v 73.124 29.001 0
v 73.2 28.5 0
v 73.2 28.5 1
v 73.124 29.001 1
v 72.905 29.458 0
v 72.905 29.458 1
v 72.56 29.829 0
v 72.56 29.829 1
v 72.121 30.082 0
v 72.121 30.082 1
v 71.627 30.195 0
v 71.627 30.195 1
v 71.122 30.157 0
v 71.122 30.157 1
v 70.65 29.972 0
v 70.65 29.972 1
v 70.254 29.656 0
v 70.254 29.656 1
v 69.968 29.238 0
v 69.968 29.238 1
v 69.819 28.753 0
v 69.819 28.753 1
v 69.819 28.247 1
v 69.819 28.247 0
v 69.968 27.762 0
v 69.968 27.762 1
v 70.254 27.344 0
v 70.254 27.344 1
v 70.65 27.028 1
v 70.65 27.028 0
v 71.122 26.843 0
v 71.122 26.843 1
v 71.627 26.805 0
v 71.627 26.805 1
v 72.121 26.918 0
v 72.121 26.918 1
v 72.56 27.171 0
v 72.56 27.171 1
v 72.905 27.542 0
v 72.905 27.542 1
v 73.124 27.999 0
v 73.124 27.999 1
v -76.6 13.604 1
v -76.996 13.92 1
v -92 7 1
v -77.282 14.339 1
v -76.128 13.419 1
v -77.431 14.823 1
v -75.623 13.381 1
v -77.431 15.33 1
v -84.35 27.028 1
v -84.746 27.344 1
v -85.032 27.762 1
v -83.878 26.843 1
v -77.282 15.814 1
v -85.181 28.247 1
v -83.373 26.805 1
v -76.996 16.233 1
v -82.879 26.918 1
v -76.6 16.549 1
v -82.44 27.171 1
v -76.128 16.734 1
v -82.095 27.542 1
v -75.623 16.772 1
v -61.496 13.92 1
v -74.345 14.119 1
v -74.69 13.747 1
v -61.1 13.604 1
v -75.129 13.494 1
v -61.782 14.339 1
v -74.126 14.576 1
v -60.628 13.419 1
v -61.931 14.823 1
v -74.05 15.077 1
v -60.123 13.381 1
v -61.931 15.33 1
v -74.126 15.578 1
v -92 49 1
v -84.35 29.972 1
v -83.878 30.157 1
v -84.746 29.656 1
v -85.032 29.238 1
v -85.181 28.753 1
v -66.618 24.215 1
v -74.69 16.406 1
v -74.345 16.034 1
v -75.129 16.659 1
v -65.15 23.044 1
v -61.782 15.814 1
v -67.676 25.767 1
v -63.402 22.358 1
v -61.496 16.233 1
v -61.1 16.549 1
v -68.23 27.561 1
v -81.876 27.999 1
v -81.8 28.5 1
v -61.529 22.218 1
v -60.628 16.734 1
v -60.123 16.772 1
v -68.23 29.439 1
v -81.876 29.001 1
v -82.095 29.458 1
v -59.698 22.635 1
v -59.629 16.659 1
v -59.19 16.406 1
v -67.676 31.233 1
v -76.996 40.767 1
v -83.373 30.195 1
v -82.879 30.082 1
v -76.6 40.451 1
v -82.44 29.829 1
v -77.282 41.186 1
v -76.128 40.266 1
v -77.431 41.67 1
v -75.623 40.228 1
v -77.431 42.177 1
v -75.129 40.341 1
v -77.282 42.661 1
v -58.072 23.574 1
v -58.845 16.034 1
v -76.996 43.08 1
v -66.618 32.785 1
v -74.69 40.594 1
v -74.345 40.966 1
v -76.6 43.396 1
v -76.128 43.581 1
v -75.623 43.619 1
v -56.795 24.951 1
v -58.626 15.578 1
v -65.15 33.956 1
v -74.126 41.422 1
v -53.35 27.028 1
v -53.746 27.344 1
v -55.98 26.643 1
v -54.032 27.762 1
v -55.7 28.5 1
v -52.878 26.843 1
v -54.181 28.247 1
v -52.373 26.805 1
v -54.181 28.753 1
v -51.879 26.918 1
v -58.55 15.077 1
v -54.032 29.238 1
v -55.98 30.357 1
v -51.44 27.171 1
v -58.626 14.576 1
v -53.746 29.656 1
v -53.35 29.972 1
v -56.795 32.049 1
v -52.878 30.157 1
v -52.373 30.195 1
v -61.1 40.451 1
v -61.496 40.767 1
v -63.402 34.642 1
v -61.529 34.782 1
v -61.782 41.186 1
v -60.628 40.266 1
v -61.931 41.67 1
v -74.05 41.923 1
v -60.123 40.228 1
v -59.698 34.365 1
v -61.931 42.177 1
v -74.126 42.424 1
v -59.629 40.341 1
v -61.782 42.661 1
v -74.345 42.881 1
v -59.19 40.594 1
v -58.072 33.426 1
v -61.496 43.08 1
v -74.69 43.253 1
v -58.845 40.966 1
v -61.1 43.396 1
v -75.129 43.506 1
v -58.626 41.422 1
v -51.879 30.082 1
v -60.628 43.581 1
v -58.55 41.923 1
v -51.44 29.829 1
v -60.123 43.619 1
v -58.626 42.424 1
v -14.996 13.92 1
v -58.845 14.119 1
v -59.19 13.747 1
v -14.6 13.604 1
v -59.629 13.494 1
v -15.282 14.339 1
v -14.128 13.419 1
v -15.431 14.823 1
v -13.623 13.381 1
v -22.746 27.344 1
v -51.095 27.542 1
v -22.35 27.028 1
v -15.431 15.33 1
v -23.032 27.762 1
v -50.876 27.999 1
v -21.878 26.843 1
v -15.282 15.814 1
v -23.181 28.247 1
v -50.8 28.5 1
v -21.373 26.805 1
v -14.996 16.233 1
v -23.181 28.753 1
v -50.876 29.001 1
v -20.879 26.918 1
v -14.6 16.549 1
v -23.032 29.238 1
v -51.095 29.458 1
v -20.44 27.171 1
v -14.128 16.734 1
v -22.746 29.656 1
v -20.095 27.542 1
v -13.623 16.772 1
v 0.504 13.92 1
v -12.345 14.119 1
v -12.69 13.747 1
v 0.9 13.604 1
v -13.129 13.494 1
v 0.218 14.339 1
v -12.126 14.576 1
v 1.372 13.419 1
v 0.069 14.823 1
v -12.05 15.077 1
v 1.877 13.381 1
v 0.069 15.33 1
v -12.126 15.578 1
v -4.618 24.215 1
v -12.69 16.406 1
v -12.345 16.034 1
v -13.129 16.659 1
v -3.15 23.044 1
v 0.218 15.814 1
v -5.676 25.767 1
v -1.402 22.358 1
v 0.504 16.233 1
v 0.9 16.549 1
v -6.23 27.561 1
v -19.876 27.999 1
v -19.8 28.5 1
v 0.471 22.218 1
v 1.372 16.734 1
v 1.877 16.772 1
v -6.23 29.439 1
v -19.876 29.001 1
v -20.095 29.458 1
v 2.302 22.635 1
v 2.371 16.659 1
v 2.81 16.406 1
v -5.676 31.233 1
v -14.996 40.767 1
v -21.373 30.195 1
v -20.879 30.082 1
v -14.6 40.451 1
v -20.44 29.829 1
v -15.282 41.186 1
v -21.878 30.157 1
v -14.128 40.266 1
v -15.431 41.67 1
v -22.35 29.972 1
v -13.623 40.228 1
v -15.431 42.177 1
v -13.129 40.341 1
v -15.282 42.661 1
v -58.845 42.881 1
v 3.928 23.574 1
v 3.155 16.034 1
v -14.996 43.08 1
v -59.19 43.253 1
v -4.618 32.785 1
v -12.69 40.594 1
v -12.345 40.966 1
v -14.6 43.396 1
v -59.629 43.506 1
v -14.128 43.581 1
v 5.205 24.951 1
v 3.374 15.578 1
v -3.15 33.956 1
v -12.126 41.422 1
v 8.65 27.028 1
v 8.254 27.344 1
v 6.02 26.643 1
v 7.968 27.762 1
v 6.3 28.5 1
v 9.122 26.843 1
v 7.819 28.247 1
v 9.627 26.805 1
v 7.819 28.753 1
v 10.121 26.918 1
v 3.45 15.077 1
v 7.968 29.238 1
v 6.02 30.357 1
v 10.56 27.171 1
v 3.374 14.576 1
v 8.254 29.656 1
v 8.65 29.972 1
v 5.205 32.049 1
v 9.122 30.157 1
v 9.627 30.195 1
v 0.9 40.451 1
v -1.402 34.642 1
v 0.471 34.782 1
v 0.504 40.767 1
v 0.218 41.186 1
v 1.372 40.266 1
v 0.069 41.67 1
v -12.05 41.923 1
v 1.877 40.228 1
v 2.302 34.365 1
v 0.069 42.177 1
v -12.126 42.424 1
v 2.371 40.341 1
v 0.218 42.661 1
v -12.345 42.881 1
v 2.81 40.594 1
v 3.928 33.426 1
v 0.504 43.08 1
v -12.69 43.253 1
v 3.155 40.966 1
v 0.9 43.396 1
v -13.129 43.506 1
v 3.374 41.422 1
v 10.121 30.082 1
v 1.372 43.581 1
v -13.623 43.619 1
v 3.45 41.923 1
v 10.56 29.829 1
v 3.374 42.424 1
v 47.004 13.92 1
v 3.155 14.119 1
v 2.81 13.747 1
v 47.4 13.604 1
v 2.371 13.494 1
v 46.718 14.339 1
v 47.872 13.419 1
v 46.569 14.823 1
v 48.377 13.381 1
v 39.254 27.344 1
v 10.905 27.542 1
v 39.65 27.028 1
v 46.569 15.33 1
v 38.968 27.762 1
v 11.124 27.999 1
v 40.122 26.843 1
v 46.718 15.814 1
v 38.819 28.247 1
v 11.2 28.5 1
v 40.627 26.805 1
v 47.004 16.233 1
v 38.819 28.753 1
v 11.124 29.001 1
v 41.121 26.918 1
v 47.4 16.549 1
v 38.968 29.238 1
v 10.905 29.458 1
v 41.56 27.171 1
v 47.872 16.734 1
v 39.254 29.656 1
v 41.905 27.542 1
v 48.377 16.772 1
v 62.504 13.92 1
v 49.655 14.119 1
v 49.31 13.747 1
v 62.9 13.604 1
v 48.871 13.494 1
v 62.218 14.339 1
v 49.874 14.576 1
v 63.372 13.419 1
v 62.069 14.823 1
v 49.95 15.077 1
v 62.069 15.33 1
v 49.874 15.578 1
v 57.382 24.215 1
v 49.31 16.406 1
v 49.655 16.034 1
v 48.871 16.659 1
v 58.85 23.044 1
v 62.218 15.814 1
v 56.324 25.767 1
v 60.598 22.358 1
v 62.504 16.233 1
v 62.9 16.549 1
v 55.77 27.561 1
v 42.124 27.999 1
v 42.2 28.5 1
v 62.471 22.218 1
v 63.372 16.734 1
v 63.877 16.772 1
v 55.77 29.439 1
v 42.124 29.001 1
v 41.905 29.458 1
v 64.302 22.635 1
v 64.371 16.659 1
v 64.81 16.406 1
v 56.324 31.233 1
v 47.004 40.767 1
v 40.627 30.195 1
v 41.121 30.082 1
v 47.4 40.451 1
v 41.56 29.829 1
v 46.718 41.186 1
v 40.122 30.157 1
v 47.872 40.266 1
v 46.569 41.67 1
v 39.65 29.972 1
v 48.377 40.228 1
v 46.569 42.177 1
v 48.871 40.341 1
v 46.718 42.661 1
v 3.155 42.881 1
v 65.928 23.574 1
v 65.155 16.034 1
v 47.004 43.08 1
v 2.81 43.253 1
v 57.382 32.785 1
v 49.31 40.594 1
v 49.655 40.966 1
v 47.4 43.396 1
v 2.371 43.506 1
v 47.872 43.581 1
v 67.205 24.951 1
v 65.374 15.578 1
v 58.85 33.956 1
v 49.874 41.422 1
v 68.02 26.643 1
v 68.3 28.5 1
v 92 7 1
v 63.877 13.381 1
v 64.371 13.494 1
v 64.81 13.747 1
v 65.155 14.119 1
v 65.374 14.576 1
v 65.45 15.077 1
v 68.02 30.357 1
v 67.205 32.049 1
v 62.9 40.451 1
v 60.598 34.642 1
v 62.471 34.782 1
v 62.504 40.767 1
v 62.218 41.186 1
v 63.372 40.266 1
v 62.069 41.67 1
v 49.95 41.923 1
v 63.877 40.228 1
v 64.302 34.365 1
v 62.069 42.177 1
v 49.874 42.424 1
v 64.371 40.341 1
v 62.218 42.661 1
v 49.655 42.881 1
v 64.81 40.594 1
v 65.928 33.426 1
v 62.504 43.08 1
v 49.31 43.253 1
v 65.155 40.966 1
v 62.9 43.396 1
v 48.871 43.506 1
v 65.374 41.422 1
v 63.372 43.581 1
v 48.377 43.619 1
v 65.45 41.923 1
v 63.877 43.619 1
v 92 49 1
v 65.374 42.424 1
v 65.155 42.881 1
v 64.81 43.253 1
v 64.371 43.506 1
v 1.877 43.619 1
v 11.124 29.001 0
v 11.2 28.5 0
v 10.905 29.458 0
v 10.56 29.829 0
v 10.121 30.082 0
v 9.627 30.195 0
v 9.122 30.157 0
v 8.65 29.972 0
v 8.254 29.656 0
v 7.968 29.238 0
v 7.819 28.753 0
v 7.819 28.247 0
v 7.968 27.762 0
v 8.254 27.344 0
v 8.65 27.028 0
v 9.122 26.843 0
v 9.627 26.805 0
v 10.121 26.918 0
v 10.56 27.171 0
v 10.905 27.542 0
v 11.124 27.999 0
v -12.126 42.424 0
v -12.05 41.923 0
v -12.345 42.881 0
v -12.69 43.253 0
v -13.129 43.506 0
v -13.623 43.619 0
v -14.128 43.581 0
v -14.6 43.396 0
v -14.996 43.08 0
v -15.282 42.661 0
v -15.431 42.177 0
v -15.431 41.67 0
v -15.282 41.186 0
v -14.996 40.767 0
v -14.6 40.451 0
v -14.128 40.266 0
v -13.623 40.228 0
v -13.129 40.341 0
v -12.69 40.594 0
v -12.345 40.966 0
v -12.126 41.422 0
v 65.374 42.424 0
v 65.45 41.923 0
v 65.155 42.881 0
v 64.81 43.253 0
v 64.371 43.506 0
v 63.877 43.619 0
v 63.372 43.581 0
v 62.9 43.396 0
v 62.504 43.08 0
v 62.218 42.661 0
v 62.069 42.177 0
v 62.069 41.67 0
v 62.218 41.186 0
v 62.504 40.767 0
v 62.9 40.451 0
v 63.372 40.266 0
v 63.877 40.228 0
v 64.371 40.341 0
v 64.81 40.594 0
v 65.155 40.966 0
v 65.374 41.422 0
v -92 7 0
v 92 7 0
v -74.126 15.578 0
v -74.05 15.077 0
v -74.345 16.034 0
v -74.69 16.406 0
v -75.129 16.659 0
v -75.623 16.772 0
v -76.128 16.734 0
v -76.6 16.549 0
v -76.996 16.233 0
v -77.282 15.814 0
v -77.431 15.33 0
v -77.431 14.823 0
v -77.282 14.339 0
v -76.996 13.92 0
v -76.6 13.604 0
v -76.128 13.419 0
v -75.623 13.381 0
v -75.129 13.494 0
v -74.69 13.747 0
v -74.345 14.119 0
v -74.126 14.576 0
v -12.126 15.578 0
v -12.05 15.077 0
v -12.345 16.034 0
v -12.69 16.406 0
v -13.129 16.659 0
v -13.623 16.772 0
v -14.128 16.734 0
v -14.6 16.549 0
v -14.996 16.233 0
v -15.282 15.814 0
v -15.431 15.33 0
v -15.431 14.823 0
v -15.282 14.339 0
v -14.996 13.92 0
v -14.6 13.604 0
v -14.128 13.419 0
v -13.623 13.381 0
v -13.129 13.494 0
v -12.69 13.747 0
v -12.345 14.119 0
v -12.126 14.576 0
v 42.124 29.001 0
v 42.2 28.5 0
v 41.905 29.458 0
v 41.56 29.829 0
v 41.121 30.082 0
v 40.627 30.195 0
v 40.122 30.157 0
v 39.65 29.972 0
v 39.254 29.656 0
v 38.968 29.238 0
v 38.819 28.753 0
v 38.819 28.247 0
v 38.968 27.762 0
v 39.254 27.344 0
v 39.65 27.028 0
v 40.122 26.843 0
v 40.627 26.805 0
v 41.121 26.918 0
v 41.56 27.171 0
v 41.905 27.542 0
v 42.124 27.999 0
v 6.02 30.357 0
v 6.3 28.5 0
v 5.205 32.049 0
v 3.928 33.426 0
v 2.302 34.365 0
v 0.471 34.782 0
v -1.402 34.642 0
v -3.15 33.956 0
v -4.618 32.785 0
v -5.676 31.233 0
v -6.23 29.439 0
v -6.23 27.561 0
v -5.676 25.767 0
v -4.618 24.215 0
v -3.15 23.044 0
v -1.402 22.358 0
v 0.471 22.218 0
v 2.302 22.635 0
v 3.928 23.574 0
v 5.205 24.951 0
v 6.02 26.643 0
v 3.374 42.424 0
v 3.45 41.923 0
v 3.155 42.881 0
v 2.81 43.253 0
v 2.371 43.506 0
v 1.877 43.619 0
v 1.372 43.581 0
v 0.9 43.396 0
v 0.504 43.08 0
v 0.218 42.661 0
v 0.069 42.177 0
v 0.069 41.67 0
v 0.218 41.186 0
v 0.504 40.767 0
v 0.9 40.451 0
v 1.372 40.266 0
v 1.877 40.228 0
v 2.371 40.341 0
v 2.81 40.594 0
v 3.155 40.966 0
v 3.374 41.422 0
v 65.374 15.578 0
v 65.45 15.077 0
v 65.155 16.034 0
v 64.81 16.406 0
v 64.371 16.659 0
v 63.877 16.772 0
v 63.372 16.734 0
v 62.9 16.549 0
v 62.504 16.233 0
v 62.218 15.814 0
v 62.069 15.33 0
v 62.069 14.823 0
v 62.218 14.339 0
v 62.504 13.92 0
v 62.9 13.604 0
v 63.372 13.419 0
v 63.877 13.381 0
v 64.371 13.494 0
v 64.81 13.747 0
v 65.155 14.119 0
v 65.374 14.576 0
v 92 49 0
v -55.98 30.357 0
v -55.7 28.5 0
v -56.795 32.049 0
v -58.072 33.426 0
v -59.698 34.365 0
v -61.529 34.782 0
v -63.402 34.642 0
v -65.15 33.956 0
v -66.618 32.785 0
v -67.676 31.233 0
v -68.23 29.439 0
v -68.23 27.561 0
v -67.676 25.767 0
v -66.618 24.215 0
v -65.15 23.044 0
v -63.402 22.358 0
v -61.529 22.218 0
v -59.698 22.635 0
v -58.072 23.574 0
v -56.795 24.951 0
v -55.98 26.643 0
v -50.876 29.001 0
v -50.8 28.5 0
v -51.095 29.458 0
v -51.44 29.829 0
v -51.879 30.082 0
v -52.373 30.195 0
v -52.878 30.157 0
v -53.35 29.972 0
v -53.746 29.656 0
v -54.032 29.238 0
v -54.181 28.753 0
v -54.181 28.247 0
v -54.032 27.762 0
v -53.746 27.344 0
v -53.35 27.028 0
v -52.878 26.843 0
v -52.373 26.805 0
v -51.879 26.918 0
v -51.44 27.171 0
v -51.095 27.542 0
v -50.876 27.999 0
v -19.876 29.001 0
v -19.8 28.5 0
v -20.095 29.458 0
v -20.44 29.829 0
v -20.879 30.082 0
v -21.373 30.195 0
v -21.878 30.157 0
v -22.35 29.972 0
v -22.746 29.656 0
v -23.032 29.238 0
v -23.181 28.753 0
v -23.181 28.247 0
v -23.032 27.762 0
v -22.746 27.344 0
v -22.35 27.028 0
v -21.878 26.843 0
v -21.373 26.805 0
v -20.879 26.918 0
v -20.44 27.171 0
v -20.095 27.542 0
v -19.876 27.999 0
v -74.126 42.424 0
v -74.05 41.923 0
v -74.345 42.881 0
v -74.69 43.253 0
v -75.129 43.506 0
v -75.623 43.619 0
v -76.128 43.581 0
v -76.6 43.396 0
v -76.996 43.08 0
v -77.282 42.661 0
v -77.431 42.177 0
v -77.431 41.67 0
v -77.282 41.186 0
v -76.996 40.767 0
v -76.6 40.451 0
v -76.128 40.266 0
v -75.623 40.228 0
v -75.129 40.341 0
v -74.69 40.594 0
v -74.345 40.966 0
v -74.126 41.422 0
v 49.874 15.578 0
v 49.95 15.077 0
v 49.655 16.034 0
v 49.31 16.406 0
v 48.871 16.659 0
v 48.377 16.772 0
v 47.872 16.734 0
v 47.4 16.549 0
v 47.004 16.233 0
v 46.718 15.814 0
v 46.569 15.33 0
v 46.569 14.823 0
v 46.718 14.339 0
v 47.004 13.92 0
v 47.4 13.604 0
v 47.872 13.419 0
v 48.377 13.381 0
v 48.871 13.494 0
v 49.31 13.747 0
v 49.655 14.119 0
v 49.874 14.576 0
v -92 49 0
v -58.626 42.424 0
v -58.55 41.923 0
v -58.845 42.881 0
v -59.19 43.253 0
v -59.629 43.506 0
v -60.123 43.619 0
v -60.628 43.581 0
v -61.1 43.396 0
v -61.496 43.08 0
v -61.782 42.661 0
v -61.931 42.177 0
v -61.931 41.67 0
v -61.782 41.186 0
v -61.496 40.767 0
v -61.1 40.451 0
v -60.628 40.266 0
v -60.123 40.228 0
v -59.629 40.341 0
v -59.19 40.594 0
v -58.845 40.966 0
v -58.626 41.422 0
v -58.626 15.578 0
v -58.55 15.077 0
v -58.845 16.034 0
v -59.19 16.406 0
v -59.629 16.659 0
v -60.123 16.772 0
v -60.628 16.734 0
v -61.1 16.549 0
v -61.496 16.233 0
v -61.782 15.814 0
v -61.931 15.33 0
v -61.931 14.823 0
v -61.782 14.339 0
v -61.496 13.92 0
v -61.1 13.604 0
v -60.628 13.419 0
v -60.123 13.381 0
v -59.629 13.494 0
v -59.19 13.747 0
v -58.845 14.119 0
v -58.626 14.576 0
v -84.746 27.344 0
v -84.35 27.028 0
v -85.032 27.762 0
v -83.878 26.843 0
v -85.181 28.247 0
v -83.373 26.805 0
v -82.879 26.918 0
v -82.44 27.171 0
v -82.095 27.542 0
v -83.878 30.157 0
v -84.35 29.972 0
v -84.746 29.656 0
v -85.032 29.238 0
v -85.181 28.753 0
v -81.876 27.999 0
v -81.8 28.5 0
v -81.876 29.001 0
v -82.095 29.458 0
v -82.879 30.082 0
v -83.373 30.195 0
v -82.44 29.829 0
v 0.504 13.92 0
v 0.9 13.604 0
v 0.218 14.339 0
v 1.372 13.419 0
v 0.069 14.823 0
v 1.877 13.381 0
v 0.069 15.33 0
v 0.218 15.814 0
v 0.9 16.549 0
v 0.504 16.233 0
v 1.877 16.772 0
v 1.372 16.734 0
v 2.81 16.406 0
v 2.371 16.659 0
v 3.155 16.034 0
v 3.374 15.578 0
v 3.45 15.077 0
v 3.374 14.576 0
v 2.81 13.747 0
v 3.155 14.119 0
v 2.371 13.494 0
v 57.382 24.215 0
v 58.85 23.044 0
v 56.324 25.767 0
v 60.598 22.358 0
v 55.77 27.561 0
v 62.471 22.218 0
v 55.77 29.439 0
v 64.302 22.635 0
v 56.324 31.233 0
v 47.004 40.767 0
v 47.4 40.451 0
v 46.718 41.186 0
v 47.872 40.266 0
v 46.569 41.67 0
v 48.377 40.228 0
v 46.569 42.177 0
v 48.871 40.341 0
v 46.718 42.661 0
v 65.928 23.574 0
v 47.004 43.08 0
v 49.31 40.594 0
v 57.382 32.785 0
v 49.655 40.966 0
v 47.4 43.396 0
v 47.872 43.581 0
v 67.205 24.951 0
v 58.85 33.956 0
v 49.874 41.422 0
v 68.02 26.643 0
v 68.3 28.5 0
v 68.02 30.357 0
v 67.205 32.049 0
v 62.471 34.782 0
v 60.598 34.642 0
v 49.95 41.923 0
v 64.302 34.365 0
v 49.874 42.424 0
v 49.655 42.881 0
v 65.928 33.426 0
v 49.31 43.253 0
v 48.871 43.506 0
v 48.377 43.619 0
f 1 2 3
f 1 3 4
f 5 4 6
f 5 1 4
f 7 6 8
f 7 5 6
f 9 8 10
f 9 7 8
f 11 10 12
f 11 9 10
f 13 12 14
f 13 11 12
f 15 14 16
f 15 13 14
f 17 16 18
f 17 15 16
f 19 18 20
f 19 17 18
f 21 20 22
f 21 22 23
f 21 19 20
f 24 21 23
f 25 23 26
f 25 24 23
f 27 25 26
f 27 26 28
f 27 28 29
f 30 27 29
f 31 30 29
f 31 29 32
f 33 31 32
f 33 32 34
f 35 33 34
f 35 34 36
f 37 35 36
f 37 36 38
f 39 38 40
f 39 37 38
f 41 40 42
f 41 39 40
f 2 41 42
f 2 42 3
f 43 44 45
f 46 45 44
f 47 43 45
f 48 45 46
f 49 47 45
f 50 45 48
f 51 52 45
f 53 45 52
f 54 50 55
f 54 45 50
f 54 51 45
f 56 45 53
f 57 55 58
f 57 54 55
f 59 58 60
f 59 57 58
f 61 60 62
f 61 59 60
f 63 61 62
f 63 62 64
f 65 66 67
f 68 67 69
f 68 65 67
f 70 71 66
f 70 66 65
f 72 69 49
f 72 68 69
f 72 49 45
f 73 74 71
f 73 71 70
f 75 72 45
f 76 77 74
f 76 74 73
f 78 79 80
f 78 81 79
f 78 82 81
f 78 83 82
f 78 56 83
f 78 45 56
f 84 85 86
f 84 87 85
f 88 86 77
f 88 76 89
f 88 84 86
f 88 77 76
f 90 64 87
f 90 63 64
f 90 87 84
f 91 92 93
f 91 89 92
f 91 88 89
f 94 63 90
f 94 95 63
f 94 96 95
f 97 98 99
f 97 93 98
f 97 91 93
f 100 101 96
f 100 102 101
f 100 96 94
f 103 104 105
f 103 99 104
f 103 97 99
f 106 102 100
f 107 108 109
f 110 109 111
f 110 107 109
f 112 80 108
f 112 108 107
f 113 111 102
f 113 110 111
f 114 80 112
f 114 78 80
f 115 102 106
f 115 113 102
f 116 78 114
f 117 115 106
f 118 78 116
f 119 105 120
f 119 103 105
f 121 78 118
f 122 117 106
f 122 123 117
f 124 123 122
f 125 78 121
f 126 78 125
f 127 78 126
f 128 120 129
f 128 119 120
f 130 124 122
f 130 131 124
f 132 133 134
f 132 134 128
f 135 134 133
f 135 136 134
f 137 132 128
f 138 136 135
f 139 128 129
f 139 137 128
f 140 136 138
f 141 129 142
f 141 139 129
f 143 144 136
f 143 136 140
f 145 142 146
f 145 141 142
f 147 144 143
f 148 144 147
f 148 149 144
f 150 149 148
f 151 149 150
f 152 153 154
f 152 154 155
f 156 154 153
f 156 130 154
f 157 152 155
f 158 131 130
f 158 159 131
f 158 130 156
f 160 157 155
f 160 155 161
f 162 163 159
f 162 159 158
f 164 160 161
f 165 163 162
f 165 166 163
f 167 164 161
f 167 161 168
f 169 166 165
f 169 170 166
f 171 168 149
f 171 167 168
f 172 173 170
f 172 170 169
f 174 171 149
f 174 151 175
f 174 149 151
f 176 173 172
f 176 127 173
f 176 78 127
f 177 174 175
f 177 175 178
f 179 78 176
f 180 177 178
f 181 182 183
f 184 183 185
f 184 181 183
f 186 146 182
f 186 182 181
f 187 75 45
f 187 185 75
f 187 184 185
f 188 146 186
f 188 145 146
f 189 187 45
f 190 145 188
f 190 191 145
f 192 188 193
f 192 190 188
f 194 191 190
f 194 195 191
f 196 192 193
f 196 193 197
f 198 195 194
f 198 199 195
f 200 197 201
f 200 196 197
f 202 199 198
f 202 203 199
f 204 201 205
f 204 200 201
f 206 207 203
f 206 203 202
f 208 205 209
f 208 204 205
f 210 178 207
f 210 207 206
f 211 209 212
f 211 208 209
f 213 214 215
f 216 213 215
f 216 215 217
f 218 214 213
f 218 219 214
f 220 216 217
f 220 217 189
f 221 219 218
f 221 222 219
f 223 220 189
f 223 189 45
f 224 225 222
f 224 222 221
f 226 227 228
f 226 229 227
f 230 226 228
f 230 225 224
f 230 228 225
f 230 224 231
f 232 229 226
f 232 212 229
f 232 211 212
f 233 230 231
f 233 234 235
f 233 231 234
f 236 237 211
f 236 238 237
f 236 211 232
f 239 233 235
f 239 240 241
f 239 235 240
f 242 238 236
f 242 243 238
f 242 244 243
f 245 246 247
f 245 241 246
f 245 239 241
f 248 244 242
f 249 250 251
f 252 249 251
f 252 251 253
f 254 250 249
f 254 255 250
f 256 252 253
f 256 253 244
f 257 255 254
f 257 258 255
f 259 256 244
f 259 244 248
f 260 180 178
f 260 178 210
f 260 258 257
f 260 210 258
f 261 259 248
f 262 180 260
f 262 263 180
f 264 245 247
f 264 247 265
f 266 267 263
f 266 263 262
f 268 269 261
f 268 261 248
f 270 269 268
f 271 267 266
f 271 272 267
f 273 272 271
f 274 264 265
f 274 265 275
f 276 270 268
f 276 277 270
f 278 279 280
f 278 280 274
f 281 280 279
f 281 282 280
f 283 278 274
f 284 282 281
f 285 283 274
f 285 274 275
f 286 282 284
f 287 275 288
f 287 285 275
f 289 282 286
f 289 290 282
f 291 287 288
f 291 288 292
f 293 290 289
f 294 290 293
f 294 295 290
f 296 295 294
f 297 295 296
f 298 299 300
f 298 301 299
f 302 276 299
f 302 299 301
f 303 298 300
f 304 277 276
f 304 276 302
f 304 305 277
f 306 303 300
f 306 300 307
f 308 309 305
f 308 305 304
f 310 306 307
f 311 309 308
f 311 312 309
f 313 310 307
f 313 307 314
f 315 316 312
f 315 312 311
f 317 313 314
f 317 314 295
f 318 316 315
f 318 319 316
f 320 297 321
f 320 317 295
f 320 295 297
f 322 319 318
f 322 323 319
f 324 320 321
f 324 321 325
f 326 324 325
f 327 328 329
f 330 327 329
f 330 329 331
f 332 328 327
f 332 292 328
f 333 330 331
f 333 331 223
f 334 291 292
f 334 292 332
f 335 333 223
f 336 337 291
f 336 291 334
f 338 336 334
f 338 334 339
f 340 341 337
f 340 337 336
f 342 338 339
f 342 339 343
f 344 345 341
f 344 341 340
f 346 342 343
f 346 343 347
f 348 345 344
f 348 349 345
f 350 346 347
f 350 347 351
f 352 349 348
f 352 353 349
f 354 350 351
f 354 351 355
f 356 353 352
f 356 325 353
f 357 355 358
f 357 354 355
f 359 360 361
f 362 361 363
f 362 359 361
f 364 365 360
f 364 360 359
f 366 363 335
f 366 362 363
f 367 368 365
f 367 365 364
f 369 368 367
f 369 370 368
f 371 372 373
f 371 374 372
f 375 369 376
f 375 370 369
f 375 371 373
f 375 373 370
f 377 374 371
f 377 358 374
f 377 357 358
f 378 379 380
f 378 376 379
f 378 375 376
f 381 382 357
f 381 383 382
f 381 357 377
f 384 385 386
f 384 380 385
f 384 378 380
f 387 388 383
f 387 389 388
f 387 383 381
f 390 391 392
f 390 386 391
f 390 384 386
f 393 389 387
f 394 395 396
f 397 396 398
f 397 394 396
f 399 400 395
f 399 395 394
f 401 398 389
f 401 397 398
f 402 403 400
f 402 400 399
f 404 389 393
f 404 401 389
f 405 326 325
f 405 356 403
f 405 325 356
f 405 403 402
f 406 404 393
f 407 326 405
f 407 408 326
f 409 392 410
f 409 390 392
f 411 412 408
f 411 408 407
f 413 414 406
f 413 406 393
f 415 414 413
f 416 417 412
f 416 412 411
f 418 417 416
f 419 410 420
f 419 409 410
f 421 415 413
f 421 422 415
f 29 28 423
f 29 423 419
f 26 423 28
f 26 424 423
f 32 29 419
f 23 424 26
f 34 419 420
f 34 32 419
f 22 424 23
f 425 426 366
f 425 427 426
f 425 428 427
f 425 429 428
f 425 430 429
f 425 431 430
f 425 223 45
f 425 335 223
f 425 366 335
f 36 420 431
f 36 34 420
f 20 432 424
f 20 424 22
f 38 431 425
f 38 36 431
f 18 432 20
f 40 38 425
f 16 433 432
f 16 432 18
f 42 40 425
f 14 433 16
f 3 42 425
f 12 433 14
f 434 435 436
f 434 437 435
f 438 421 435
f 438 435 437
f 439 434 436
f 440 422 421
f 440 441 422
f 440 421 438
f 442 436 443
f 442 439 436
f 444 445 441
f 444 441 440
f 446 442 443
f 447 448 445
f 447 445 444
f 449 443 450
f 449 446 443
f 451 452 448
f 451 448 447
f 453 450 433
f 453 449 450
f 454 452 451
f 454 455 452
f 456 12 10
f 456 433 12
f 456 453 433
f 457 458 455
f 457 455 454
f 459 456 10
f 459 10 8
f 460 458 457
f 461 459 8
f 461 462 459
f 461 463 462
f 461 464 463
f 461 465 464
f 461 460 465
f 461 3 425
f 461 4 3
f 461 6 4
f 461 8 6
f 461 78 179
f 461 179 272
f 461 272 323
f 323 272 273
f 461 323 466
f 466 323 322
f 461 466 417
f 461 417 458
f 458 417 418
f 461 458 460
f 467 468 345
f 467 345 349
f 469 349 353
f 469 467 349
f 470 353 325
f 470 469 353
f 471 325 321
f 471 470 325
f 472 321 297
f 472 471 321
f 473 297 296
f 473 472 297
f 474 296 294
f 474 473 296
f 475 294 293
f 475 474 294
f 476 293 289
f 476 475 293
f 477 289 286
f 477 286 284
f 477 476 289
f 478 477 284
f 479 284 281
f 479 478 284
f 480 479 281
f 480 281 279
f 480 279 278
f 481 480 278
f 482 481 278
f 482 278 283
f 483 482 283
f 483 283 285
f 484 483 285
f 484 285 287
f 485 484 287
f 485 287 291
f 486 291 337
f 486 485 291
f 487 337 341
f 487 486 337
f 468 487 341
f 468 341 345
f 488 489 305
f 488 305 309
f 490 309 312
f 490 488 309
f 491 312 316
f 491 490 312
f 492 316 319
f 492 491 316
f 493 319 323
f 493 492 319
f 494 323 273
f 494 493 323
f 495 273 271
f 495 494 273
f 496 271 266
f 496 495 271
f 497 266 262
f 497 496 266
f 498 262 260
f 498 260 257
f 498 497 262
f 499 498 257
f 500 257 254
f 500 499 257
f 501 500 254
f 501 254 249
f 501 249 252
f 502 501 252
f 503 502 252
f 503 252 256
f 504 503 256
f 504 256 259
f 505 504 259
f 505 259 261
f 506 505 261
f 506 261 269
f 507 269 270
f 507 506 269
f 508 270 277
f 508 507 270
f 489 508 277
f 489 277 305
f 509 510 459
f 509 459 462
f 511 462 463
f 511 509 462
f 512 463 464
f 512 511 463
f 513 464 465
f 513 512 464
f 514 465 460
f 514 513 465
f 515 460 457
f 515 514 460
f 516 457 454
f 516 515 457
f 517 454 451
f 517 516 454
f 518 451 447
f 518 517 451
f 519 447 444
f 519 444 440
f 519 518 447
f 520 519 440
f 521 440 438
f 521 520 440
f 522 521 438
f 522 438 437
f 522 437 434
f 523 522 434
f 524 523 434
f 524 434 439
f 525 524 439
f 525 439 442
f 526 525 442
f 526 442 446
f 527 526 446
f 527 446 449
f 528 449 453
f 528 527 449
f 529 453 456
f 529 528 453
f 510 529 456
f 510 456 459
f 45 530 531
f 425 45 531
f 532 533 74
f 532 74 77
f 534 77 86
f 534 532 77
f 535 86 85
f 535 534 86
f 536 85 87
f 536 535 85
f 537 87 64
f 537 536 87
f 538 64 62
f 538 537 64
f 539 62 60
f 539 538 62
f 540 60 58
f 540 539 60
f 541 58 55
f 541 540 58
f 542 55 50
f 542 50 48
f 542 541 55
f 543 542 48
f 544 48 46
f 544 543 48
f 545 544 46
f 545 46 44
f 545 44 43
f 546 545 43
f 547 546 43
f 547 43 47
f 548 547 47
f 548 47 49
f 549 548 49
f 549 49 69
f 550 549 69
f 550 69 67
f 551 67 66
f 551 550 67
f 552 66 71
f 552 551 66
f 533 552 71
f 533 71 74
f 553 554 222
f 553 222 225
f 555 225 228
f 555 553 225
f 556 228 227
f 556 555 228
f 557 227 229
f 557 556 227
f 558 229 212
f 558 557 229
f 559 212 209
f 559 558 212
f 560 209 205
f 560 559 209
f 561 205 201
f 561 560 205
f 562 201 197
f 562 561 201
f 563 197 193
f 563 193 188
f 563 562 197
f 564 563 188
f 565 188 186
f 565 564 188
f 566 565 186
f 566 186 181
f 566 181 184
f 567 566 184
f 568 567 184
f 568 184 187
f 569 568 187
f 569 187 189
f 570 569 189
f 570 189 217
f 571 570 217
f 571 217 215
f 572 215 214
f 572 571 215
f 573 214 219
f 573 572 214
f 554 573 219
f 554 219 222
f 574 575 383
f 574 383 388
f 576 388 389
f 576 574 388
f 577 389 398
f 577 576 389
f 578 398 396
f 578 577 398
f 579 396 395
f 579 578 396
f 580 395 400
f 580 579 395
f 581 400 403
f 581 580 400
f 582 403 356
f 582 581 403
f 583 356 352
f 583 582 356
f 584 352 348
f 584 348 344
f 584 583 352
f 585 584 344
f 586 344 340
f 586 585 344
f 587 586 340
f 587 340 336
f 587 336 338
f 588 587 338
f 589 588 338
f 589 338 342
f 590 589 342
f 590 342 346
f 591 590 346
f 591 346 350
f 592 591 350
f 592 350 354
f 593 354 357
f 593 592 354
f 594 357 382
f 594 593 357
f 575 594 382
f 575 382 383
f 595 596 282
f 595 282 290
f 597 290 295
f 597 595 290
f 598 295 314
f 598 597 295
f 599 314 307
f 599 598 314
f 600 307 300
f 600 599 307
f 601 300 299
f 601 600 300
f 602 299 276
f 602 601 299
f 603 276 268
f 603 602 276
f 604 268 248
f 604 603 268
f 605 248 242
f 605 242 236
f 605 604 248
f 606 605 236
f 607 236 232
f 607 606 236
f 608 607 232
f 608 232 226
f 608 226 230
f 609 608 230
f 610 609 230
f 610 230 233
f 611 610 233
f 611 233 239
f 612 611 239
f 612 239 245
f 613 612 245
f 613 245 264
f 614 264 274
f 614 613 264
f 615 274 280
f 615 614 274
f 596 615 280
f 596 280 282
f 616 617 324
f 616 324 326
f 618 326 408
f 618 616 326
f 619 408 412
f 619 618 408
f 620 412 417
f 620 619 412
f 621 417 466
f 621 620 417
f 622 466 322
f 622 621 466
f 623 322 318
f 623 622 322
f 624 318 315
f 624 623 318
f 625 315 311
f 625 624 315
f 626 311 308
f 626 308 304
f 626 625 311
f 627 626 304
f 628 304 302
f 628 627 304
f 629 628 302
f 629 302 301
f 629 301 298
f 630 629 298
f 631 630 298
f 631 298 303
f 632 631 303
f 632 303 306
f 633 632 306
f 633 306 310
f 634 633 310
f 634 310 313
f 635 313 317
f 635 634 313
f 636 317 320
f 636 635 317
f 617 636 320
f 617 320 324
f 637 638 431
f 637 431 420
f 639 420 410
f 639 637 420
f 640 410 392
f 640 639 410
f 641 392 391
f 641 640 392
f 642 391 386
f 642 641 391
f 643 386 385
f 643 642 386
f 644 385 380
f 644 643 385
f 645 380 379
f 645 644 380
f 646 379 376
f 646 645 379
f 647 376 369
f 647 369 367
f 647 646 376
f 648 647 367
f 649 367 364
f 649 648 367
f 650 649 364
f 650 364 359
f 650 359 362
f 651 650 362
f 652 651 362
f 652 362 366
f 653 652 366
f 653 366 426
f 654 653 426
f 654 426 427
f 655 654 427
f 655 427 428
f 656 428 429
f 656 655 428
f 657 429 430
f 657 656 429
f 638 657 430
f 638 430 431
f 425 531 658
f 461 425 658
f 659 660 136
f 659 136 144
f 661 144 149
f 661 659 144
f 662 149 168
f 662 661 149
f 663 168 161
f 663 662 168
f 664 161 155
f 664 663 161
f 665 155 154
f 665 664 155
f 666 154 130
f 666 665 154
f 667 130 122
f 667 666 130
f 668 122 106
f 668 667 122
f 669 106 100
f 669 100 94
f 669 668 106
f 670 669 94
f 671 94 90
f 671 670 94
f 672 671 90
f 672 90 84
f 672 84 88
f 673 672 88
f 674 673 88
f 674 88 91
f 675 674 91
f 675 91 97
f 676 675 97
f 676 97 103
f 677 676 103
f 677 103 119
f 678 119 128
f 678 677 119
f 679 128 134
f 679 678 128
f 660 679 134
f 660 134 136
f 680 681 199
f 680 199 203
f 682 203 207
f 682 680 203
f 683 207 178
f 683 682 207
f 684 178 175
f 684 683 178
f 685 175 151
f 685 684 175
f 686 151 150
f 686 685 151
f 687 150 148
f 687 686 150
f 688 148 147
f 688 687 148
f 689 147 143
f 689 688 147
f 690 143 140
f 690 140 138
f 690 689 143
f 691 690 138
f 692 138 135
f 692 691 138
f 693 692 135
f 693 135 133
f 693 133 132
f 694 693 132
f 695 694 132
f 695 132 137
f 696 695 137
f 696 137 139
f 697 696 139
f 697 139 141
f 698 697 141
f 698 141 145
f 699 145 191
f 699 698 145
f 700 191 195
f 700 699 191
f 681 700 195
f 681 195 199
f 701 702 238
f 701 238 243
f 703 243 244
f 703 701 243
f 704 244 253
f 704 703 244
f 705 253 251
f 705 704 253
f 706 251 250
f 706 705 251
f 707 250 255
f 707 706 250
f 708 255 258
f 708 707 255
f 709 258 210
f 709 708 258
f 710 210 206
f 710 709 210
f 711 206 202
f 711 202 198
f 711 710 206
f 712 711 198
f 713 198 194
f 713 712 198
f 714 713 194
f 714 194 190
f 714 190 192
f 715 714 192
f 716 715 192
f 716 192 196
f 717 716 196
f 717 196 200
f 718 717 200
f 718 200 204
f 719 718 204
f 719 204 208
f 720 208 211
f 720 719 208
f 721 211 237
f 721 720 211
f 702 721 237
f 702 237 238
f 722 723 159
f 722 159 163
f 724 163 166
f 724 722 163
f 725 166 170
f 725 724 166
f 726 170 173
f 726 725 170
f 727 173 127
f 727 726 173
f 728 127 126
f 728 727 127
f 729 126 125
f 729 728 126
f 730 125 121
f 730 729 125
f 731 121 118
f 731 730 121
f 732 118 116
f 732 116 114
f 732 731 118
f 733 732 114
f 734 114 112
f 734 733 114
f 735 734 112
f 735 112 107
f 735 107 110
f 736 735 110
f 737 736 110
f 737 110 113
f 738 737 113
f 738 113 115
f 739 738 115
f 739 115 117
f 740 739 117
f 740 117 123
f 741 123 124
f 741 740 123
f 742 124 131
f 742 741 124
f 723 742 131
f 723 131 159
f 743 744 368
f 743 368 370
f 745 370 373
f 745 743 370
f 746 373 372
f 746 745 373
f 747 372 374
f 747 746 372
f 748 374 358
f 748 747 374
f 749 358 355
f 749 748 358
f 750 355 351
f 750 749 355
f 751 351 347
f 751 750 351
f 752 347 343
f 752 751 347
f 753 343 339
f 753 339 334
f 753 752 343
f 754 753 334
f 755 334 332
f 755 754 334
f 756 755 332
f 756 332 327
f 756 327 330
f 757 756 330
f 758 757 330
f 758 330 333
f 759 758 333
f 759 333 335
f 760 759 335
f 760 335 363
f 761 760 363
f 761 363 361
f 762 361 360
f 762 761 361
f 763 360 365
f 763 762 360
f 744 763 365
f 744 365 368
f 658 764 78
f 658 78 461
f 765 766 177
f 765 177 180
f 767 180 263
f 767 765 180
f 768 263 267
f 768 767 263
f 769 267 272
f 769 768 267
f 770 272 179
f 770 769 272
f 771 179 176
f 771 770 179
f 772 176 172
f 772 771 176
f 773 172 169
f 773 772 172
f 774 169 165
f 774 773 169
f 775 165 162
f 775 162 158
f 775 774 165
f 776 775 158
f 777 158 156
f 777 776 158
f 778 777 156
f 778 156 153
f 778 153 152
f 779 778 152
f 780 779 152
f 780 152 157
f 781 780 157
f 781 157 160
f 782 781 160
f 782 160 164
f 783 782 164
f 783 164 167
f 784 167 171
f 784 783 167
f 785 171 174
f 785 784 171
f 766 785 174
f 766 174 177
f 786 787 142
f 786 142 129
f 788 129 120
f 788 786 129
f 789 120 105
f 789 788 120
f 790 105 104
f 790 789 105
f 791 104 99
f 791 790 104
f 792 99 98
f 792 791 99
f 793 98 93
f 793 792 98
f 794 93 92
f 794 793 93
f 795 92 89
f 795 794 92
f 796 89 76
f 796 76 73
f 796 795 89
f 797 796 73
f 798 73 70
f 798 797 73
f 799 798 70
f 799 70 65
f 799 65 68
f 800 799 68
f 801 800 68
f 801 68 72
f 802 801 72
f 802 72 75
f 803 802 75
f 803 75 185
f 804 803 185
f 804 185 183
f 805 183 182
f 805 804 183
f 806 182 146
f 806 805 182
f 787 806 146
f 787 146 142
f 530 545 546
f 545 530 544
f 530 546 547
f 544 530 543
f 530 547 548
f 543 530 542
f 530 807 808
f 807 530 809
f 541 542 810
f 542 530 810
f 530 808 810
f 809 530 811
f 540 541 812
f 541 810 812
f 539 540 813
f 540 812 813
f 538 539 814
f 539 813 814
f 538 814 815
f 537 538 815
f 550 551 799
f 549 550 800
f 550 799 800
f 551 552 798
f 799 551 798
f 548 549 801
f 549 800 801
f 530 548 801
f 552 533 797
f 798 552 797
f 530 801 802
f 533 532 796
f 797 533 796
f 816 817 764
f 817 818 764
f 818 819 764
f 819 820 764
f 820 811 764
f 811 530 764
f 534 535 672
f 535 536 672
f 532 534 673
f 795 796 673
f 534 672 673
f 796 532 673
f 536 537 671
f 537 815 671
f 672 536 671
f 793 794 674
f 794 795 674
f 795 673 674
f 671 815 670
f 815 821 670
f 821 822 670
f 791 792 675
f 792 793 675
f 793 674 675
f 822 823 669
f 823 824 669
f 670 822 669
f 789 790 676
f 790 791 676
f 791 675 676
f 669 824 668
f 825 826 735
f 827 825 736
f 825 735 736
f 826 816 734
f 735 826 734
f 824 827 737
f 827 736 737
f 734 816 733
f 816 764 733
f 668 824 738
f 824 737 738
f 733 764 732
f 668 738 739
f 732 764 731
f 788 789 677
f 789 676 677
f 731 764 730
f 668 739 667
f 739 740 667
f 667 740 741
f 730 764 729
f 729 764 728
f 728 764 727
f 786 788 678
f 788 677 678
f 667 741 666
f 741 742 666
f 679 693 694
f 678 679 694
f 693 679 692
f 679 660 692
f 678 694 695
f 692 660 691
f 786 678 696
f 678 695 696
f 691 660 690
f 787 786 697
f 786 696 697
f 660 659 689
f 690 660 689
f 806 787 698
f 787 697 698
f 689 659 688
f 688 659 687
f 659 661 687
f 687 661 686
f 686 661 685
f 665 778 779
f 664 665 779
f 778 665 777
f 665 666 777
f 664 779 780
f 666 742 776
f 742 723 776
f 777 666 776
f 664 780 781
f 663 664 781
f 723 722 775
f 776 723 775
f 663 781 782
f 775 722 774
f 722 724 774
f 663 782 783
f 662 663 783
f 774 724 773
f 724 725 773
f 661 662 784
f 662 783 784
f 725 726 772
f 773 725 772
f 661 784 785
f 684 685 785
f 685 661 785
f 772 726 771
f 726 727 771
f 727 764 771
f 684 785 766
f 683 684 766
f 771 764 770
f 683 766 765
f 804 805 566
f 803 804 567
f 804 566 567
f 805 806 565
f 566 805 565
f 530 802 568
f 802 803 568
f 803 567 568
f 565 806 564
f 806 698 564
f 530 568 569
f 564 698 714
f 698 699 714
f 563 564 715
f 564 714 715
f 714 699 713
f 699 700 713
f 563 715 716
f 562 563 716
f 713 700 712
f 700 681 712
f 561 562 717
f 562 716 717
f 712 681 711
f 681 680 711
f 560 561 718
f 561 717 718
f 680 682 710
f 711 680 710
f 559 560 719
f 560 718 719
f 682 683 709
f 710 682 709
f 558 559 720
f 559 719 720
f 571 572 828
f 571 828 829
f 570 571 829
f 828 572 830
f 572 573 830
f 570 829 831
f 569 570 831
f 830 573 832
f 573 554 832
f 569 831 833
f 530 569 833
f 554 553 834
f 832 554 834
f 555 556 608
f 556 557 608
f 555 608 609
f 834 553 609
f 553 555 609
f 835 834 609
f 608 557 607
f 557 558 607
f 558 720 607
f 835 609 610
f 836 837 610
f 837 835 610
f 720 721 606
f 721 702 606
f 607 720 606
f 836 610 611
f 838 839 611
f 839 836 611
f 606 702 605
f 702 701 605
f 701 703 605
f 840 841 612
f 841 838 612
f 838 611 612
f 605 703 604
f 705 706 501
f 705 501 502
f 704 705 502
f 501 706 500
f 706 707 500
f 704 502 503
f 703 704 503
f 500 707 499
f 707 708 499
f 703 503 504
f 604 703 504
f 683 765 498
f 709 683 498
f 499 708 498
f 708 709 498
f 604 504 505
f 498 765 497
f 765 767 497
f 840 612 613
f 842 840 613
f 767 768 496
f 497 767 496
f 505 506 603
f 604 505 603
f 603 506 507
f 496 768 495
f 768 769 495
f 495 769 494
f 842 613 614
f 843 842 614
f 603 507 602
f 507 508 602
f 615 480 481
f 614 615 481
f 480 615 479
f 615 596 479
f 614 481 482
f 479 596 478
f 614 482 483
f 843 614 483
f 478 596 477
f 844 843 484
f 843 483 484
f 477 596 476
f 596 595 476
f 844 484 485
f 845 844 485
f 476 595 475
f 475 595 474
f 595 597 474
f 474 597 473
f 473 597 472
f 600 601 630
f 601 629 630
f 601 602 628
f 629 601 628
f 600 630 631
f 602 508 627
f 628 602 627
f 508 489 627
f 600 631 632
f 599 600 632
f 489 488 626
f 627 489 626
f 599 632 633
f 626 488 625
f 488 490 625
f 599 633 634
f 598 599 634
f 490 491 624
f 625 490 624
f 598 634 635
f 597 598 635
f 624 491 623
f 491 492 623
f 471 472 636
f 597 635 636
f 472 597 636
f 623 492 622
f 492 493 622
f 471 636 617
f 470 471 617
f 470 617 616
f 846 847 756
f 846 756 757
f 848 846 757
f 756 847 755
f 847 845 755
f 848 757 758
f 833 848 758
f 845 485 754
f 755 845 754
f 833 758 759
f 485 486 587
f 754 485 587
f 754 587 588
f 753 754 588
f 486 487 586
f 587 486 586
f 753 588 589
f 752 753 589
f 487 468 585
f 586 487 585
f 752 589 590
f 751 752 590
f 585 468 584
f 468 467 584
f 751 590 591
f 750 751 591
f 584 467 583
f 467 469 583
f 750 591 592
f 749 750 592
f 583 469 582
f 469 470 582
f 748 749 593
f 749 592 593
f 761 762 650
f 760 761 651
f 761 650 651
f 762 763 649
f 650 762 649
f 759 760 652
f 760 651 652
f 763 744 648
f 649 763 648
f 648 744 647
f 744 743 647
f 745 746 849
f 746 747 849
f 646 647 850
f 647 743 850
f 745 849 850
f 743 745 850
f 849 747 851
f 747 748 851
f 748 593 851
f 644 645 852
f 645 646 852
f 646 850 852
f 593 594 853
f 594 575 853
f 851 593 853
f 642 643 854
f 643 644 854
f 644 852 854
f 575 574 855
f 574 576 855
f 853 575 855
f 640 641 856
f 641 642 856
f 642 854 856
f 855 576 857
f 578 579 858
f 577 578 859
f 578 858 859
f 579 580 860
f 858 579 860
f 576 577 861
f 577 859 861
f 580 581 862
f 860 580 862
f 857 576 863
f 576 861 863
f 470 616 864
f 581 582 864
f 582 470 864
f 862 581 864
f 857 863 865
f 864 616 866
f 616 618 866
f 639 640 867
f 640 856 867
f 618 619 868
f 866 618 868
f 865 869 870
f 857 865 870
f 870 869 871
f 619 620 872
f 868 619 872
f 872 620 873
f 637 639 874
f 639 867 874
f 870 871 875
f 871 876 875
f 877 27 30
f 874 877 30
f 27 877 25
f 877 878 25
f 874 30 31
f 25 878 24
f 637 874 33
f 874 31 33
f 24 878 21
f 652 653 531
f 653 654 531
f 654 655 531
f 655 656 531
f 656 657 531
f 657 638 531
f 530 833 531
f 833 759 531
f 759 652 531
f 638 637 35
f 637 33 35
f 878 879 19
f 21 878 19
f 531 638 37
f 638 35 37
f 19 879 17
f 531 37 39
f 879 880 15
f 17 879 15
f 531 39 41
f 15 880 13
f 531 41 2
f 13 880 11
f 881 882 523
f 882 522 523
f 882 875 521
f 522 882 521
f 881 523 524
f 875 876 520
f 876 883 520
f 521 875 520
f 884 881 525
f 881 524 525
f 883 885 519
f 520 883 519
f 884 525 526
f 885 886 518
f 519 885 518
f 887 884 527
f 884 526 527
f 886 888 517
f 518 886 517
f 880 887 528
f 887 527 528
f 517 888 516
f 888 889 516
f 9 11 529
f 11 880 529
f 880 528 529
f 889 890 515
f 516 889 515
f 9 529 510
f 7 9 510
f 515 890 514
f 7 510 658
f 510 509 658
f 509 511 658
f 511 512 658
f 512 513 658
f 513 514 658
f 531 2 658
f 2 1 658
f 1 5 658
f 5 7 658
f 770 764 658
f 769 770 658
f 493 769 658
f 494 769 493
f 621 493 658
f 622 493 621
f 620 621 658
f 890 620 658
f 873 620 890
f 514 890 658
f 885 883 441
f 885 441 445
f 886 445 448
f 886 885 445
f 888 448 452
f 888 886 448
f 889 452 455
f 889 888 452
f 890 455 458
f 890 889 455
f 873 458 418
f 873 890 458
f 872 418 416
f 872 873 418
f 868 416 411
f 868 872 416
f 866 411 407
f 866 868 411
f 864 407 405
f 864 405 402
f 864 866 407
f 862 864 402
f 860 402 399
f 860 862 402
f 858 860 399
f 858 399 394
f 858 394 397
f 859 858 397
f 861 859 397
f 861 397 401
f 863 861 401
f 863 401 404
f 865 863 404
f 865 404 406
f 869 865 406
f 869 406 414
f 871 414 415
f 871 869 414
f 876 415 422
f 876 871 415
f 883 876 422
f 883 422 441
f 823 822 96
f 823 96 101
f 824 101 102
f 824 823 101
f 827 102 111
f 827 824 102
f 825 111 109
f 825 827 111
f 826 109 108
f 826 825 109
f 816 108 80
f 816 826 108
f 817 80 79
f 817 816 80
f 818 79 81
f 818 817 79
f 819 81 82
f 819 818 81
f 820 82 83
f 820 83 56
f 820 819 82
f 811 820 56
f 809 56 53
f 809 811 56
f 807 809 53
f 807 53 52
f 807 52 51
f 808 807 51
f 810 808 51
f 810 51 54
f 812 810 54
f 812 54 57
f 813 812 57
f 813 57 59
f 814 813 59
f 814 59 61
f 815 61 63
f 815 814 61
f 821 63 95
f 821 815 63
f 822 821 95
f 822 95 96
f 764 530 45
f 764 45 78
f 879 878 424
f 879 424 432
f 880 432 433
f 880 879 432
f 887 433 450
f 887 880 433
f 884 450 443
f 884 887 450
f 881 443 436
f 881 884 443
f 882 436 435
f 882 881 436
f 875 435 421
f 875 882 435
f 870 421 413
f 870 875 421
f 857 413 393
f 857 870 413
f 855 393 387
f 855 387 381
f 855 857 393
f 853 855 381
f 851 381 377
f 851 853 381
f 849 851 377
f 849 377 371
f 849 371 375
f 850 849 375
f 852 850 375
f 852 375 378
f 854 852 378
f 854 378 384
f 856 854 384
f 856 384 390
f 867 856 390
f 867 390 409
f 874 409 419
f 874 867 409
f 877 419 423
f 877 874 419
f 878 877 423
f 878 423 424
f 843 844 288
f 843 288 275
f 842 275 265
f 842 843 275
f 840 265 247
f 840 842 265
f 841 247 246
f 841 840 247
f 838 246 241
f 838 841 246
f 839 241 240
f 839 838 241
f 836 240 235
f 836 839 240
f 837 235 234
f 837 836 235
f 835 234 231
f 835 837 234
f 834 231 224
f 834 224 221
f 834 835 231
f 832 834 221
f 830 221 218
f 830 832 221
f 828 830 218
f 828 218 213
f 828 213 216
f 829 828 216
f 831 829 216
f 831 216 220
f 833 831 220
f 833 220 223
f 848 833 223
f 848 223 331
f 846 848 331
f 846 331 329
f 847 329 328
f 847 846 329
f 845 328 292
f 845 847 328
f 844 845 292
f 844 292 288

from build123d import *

# Parameters (mm, degrees)
BOSS_BORES_AND_POSITIVE_GEARBOX_MOUN_2_W       = 184
BOSS_BORES_AND_POSITIVE_GEARBOX_MOUN_2_H       = 42
BOSS_BORES_AND_POSITIVE_GEARBOX_MOUN_2_R       = 6.3
BOSS_BORES_AND_POSITIVE_GEARBOX_MOUN_2_R_2     = 1.7
BOSS_BORES_AND_POSITIVE_GEARBOX_MOUNTING_DEPTH = 1


with BuildPart() as part:
    # Boss bores and positive gearbox moun 2 → Boss bores and positive gearbox mounting (new body)
    with BuildSketch(Plane.XY):
        with Locations((0, 28)):
            Rectangle(BOSS_BORES_AND_POSITIVE_GEARBOX_MOUN_2_W, BOSS_BORES_AND_POSITIVE_GEARBOX_MOUN_2_H)
        with Locations((-62, 28.5)):
            Circle(BOSS_BORES_AND_POSITIVE_GEARBOX_MOUN_2_R, mode=Mode.SUBTRACT)
        with Locations((0, 28.5)):
            Circle(BOSS_BORES_AND_POSITIVE_GEARBOX_MOUN_2_R, mode=Mode.SUBTRACT)
        with Locations((62, 28.5)):
            Circle(BOSS_BORES_AND_POSITIVE_GEARBOX_MOUN_2_R, mode=Mode.SUBTRACT)
        with Locations((-52.5, 28.5)):
            Circle(BOSS_BORES_AND_POSITIVE_GEARBOX_MOUN_2_R_2, mode=Mode.SUBTRACT)
        with Locations((-60.25, 41.923393759)):
            Circle(BOSS_BORES_AND_POSITIVE_GEARBOX_MOUN_2_R_2, mode=Mode.SUBTRACT)
        with Locations((-75.75, 41.923393759)):
            Circle(BOSS_BORES_AND_POSITIVE_GEARBOX_MOUN_2_R_2, mode=Mode.SUBTRACT)
        with Locations((-83.5, 28.5)):
            Circle(BOSS_BORES_AND_POSITIVE_GEARBOX_MOUN_2_R_2, mode=Mode.SUBTRACT)
        with Locations((-75.75, 15.076606241)):
            Circle(BOSS_BORES_AND_POSITIVE_GEARBOX_MOUN_2_R_2, mode=Mode.SUBTRACT)
        with Locations((-60.25, 15.076606241)):
            Circle(BOSS_BORES_AND_POSITIVE_GEARBOX_MOUN_2_R_2, mode=Mode.SUBTRACT)
        with Locations((9.5, 28.5)):
            Circle(BOSS_BORES_AND_POSITIVE_GEARBOX_MOUN_2_R_2, mode=Mode.SUBTRACT)
        with Locations((1.75, 41.923393759)):
            Circle(BOSS_BORES_AND_POSITIVE_GEARBOX_MOUN_2_R_2, mode=Mode.SUBTRACT)
        with Locations((-13.75, 41.923393759)):
            Circle(BOSS_BORES_AND_POSITIVE_GEARBOX_MOUN_2_R_2, mode=Mode.SUBTRACT)
        with Locations((-21.5, 28.5)):
            Circle(BOSS_BORES_AND_POSITIVE_GEARBOX_MOUN_2_R_2, mode=Mode.SUBTRACT)
        with Locations((-13.75, 15.076606241)):
            Circle(BOSS_BORES_AND_POSITIVE_GEARBOX_MOUN_2_R_2, mode=Mode.SUBTRACT)
        with Locations((1.75, 15.076606241)):
            Circle(BOSS_BORES_AND_POSITIVE_GEARBOX_MOUN_2_R_2, mode=Mode.SUBTRACT)
        with Locations((71.5, 28.5)):
            Circle(BOSS_BORES_AND_POSITIVE_GEARBOX_MOUN_2_R_2, mode=Mode.SUBTRACT)
        with Locations((63.75, 41.923393759)):
            Circle(BOSS_BORES_AND_POSITIVE_GEARBOX_MOUN_2_R_2, mode=Mode.SUBTRACT)
        with Locations((48.25, 41.923393759)):
            Circle(BOSS_BORES_AND_POSITIVE_GEARBOX_MOUN_2_R_2, mode=Mode.SUBTRACT)
        with Locations((40.5, 28.5)):
            Circle(BOSS_BORES_AND_POSITIVE_GEARBOX_MOUN_2_R_2, mode=Mode.SUBTRACT)
        with Locations((48.25, 15.076606241)):
            Circle(BOSS_BORES_AND_POSITIVE_GEARBOX_MOUN_2_R_2, mode=Mode.SUBTRACT)
        with Locations((63.75, 15.076606241)):
            Circle(BOSS_BORES_AND_POSITIVE_GEARBOX_MOUN_2_R_2, mode=Mode.SUBTRACT)
    extrude(amount=BOSS_BORES_AND_POSITIVE_GEARBOX_MOUNTING_DEPTH)


solid = part.part
